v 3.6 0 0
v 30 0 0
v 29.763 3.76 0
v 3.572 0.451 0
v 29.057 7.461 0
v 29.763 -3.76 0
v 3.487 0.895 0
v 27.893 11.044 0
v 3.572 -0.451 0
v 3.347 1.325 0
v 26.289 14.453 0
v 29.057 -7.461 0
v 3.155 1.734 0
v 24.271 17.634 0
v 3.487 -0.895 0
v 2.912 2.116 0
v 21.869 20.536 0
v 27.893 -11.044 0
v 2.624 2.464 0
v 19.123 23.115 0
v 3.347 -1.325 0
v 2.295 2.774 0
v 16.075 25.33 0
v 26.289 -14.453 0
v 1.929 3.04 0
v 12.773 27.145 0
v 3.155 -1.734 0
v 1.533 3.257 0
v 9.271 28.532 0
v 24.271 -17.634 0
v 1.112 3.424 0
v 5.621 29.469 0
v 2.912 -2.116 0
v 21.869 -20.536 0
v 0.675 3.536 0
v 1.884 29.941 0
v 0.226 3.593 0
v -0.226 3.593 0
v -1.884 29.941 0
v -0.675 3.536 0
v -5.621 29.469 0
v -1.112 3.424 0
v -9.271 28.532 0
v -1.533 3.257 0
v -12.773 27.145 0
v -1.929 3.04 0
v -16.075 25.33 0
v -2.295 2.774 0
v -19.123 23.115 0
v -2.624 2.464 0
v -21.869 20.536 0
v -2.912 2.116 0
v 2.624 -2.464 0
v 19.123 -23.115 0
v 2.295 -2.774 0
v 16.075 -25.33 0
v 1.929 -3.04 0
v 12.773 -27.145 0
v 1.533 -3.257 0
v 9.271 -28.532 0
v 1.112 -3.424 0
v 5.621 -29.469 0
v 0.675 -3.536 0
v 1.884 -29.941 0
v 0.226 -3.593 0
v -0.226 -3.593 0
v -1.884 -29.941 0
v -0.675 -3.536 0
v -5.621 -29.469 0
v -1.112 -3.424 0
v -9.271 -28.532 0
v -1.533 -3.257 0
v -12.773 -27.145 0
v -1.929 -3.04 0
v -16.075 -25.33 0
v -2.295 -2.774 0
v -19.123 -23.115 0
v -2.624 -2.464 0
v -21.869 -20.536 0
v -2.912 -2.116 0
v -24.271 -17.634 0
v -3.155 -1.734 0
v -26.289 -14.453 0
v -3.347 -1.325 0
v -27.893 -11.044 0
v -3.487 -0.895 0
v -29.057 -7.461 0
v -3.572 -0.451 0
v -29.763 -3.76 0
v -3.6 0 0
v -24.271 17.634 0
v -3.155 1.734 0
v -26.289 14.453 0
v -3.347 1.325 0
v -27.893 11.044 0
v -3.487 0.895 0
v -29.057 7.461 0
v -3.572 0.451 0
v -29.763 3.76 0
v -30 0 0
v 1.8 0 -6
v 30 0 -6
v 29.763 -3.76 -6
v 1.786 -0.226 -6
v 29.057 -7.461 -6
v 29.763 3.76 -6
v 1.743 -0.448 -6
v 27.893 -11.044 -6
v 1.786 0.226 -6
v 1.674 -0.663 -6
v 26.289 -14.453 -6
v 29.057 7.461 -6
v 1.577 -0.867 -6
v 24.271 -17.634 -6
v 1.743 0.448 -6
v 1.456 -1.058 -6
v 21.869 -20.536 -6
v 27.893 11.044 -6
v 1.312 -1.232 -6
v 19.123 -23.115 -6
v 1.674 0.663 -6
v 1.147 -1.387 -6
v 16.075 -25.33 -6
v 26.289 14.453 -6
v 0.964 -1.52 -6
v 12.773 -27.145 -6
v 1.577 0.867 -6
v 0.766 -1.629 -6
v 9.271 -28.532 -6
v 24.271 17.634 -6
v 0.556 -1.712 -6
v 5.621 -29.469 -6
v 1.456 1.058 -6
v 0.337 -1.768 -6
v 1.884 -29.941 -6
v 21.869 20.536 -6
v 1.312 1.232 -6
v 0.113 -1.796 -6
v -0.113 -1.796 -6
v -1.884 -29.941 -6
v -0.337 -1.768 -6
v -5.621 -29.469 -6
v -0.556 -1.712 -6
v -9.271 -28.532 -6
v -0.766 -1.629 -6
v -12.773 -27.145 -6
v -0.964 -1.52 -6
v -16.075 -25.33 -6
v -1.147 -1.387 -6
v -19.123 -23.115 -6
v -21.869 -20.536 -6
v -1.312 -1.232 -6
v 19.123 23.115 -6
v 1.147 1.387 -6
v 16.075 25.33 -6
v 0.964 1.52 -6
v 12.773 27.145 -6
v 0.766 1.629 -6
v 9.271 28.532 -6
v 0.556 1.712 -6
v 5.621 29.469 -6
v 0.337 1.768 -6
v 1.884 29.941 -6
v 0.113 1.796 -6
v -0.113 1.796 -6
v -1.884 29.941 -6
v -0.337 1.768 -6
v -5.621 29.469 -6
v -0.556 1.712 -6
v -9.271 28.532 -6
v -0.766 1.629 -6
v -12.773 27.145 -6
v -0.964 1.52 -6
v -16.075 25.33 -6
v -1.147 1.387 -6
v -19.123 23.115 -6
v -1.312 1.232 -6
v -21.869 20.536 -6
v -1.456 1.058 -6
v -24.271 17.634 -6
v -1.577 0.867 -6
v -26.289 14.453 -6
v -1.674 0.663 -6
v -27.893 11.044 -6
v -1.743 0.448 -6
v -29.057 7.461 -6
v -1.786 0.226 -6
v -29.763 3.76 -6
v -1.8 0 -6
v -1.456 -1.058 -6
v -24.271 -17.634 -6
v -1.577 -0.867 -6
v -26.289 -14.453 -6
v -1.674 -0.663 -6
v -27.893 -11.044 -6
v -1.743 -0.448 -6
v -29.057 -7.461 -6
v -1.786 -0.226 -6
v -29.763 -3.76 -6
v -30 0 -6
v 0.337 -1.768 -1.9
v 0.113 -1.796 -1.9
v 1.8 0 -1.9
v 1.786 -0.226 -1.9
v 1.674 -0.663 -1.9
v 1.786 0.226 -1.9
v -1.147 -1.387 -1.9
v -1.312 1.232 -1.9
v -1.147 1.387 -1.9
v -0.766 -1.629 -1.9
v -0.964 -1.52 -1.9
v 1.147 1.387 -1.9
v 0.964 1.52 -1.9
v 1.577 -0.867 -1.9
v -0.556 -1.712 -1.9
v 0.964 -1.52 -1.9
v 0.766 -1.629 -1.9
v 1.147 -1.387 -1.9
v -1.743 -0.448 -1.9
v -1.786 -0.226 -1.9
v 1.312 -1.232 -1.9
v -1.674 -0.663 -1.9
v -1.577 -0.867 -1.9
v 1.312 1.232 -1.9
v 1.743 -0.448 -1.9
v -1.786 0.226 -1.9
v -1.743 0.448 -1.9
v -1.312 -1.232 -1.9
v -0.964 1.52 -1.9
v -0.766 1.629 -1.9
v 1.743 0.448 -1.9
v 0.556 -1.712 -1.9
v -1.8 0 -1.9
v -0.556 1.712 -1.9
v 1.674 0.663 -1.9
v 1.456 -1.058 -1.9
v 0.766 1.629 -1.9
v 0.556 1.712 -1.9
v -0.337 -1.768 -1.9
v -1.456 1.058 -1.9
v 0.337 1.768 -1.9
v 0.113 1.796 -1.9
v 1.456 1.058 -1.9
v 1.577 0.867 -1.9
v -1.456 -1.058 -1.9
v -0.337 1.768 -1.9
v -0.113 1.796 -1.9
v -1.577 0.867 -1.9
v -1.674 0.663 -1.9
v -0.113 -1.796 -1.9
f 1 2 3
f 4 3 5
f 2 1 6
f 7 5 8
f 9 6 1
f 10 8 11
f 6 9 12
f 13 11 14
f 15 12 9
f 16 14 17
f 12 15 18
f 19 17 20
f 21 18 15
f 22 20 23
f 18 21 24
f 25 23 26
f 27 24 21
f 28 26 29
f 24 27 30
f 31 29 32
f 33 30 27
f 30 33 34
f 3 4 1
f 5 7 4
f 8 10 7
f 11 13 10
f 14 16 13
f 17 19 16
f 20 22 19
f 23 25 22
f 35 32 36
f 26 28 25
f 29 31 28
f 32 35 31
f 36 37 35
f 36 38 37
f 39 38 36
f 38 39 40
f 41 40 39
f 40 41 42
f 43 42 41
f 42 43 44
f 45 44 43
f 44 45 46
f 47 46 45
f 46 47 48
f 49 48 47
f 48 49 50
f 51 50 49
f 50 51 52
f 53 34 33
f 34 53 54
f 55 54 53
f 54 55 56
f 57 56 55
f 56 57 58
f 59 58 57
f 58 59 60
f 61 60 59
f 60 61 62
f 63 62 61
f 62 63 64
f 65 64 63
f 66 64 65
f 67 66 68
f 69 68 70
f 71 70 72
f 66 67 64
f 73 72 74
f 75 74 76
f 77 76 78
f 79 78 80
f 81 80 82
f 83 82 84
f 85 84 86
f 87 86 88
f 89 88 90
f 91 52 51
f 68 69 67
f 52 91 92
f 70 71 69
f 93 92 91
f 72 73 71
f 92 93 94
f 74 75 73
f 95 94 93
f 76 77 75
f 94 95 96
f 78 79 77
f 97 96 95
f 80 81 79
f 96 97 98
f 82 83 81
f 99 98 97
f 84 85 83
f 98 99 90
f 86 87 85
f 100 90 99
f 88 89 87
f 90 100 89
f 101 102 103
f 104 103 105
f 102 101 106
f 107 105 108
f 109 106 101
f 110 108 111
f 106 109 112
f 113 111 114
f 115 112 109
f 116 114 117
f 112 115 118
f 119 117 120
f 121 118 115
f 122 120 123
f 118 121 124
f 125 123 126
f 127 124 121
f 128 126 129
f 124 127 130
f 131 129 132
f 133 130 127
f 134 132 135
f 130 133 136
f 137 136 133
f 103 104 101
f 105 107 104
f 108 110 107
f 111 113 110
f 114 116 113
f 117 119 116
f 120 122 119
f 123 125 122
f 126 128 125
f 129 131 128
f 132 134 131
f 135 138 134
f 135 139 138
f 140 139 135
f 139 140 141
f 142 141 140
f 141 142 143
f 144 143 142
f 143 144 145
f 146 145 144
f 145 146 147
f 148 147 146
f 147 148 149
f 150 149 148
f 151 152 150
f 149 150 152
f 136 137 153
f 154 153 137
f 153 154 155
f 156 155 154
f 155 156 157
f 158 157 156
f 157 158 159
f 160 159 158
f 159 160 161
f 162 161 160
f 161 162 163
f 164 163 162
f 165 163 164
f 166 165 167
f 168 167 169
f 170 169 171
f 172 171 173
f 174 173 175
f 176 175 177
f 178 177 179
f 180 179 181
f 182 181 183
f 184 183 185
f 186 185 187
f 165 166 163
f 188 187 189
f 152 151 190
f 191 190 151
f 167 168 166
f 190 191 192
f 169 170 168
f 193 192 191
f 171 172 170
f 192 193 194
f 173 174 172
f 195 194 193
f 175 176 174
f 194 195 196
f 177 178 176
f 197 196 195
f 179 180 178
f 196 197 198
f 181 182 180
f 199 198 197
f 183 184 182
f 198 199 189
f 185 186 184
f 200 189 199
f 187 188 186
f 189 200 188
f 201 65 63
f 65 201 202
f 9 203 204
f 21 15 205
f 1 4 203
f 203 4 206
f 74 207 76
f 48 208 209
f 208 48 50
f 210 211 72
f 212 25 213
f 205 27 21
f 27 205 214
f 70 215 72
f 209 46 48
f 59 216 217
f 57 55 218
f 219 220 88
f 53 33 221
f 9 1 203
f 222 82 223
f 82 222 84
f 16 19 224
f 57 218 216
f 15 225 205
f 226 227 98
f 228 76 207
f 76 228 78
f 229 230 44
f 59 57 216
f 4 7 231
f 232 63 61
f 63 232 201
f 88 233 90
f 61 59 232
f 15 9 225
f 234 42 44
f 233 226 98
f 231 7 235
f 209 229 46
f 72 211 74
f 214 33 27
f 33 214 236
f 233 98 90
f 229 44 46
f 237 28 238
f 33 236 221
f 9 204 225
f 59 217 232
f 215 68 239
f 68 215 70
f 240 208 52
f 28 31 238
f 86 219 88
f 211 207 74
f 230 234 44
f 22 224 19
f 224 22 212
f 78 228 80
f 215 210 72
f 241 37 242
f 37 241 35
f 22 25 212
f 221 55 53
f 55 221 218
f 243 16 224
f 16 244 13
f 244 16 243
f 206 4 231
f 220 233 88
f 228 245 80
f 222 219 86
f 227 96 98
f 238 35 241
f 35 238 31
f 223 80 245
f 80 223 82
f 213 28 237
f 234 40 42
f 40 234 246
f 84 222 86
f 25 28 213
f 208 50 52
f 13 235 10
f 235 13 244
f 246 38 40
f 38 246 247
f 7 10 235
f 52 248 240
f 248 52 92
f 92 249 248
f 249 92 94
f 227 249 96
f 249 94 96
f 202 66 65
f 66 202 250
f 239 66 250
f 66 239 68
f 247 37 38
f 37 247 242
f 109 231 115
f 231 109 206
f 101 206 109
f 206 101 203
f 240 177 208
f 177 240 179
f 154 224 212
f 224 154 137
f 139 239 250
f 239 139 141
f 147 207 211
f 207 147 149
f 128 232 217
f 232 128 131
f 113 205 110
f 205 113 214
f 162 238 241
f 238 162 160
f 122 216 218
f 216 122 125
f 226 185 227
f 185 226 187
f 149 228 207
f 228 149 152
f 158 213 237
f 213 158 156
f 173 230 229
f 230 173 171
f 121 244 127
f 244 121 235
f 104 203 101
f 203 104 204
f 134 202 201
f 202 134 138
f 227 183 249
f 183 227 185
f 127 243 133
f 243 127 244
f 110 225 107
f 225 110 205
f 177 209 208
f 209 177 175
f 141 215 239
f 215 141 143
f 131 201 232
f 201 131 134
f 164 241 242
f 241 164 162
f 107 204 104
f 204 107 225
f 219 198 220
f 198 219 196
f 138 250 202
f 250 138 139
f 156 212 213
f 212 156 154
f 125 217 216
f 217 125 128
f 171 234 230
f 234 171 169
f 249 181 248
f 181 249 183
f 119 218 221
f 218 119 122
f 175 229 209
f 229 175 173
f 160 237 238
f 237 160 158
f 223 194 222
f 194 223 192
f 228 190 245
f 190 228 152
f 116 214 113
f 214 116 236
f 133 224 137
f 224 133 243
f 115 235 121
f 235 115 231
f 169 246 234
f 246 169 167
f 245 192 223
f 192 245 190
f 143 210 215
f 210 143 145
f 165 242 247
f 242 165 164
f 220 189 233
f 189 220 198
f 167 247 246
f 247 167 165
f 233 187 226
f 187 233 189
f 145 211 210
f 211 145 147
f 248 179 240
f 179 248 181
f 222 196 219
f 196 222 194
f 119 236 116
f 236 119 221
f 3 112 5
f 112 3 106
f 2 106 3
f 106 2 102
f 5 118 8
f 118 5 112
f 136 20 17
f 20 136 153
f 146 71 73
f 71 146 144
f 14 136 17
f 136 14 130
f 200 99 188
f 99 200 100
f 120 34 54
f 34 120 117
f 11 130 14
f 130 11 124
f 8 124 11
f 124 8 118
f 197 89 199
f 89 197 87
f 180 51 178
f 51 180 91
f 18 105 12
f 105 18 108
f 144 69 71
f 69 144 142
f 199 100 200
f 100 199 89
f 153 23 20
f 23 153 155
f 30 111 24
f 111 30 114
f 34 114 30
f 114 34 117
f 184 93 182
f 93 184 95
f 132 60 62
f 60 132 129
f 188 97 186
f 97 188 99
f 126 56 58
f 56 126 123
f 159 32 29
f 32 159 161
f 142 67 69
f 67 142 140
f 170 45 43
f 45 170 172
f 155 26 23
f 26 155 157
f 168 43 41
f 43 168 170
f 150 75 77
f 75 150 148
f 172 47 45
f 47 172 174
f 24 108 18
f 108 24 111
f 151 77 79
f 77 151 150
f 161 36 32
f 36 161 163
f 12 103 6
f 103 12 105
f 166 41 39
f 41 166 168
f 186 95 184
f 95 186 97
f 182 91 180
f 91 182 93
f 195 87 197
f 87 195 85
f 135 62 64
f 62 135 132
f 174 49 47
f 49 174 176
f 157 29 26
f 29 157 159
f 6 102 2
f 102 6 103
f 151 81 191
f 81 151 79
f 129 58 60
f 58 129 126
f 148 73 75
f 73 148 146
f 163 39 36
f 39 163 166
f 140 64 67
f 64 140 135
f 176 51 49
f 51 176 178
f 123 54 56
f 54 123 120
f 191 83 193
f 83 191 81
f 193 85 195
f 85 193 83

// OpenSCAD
$fn = 50;


difference() {
	union() {
		translate(v = [0, 0, -6.0000000000]) {
			cylinder(h = 6, r = 30.0000000000);
		}
	}
	union() {
		translate(v = [0, 0, 0]) {
			rotate(a = [0, 0, 0]) {
				difference() {
					union() {
						translate(v = [0, 0, -6.0000000000]) {
							cylinder(h = 6, r = 1.5000000000);
						}
						translate(v = [0, 0, -1.9000000000]) {
							cylinder(h = 1.9000000000, r1 = 1.8000000000, r2 = 3.6000000000);
						}
						translate(v = [0, 0, -6.0000000000]) {
							cylinder(h = 6, r = 1.8000000000);
						}
						translate(v = [0, 0, -6.0000000000]) {
							cylinder(h = 6, r = 1.5000000000);
						}
					}
					union();
				}
			}
		}
	}
}
